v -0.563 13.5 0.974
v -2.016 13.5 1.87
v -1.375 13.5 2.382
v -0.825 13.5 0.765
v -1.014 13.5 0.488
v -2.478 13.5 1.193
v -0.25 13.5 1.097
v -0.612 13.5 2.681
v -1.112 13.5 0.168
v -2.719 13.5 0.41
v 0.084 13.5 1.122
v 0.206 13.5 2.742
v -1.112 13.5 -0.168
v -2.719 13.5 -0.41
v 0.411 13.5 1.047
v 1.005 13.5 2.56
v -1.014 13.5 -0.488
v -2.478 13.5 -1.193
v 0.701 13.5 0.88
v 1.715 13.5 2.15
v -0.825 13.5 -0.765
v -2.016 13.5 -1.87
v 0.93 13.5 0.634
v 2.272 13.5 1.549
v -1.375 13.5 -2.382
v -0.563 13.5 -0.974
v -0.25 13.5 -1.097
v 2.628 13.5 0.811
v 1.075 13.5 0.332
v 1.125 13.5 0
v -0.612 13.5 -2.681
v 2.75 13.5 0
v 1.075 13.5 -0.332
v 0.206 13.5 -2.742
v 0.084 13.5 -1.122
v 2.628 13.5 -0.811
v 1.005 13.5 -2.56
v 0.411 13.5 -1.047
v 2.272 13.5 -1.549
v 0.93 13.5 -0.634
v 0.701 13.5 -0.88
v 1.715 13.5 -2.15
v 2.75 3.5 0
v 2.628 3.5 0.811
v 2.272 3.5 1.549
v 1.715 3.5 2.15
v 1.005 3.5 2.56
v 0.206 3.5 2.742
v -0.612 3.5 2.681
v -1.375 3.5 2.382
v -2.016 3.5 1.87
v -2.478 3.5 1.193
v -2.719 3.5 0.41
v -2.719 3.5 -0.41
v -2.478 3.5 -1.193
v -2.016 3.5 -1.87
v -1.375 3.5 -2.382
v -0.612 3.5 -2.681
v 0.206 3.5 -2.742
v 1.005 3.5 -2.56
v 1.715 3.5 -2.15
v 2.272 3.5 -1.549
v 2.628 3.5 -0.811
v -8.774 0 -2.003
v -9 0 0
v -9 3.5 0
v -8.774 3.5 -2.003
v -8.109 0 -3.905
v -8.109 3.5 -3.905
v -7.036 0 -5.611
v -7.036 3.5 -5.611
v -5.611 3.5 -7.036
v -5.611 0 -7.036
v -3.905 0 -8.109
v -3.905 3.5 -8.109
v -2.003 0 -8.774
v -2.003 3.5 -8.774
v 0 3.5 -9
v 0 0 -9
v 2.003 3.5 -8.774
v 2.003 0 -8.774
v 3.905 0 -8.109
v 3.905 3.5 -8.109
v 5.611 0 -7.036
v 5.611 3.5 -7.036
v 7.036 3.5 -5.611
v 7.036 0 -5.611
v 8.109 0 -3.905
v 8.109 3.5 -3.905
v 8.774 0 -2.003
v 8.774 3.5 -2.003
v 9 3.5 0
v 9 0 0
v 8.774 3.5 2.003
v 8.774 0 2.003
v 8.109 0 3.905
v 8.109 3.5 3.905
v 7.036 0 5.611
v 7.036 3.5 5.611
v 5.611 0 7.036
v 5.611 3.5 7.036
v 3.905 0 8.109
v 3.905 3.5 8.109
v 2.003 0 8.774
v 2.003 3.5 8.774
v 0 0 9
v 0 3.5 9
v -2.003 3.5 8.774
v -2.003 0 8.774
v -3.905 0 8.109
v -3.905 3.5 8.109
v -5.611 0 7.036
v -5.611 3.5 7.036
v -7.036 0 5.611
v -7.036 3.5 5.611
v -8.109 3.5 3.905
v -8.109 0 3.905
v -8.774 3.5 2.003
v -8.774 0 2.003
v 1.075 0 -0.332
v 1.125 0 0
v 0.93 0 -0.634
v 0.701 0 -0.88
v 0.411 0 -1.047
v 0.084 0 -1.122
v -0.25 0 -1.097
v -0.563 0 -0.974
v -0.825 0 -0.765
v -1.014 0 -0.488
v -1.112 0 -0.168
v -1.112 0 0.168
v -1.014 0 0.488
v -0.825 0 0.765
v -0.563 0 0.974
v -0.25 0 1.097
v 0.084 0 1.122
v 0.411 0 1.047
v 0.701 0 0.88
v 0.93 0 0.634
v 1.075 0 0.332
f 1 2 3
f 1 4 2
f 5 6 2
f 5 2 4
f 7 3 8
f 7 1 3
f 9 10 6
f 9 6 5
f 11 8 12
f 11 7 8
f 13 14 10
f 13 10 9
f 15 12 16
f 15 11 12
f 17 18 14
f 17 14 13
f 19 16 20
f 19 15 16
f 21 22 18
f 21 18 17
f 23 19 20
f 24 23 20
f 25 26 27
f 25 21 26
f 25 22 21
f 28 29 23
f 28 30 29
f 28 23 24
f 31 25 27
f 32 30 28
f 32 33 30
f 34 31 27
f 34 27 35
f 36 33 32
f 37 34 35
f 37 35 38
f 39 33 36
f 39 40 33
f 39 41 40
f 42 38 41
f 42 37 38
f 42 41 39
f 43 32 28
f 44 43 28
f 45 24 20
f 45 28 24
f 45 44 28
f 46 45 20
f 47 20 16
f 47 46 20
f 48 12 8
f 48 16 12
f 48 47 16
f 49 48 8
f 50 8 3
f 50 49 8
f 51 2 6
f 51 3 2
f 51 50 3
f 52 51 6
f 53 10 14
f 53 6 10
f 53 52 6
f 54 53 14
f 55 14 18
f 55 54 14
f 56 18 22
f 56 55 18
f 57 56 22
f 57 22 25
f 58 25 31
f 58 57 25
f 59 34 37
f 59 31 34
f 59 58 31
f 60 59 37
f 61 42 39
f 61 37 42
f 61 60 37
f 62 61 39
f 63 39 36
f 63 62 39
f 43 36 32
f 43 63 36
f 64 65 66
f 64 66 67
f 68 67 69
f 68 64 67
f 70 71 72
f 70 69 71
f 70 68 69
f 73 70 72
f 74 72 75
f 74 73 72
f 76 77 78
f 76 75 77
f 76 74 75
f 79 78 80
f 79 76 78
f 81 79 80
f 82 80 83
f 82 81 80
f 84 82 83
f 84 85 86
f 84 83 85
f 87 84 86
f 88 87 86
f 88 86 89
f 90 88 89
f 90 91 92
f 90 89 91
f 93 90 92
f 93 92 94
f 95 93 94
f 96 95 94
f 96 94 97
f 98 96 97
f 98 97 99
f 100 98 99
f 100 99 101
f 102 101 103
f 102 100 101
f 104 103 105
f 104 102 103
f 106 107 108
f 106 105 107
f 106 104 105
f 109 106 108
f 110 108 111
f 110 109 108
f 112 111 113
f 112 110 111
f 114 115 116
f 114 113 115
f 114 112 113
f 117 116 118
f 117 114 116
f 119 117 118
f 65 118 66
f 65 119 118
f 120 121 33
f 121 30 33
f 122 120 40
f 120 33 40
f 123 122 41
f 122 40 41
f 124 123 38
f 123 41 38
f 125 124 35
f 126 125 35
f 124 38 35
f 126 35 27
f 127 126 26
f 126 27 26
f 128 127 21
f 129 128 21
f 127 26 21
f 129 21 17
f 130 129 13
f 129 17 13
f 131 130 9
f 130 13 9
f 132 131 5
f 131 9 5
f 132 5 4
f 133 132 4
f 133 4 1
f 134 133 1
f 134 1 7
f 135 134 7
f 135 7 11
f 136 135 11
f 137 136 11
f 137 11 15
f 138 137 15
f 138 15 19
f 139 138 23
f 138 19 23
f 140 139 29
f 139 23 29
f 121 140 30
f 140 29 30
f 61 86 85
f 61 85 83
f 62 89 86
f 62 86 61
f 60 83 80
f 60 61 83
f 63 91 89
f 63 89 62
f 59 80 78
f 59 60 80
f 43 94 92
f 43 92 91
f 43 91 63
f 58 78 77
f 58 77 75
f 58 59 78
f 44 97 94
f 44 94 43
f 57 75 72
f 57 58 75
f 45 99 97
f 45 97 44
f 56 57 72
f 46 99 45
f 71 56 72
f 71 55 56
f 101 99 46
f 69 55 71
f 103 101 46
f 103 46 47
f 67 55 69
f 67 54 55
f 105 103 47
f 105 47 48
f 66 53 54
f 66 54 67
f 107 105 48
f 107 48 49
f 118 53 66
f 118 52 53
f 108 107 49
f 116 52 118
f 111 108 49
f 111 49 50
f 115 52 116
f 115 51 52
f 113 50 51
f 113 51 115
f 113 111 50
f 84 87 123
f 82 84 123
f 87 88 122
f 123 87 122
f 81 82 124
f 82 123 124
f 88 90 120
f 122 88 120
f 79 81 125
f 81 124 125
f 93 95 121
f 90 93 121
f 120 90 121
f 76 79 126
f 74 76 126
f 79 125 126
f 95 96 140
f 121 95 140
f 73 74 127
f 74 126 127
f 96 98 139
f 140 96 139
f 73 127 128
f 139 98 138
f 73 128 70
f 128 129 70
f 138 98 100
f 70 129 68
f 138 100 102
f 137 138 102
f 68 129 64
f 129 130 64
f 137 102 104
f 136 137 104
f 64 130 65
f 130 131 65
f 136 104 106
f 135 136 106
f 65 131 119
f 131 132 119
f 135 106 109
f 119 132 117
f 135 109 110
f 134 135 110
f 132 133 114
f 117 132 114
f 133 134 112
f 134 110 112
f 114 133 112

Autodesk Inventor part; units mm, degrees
ref_plane "YZ Plane" through (0, 0, 0) normal (1, 0, 0) x (0, 1, 0)
ref_plane "XZ Plane" through (0, 0, 0) normal (0, 1, 0) x (-1, 0, 0)
ref_plane "XY Plane" through (0, 0, 0) normal (0, 0, 1) x (1, 0, 0)
sketch "Sketch1" plane through (0, 0, 0) normal (0, 1, 0) x (-1, 0, 0)
  circle A0 centre (0, 0) radius 9
  dimension "d0" = 18
extrude "Extrusion1" add sketch "Sketch1" along normal blind 3.5
sketch "Sketch2" plane through (0, 3.5, 0) normal (0, 1, 0) x (1, 0, 0)
  circle A0 centre (0, 0) radius 2.75
  dimension "d3" = 5.5
extrude "Extrusion2" add sketch "Sketch2" along normal blind 10
sketch "Sketch3" plane through (0, 13.5, 0) normal (0, 1, 0) x (1, 0, 0)
  circle A0 centre (0, 0) radius 1.125
  dimension "d6" = 2.25
extrude "Extrusion3" cut sketch "Sketch3" against normal up to surface (13.5 mm away)
properties part number "Belt_Bearing_Holder"
